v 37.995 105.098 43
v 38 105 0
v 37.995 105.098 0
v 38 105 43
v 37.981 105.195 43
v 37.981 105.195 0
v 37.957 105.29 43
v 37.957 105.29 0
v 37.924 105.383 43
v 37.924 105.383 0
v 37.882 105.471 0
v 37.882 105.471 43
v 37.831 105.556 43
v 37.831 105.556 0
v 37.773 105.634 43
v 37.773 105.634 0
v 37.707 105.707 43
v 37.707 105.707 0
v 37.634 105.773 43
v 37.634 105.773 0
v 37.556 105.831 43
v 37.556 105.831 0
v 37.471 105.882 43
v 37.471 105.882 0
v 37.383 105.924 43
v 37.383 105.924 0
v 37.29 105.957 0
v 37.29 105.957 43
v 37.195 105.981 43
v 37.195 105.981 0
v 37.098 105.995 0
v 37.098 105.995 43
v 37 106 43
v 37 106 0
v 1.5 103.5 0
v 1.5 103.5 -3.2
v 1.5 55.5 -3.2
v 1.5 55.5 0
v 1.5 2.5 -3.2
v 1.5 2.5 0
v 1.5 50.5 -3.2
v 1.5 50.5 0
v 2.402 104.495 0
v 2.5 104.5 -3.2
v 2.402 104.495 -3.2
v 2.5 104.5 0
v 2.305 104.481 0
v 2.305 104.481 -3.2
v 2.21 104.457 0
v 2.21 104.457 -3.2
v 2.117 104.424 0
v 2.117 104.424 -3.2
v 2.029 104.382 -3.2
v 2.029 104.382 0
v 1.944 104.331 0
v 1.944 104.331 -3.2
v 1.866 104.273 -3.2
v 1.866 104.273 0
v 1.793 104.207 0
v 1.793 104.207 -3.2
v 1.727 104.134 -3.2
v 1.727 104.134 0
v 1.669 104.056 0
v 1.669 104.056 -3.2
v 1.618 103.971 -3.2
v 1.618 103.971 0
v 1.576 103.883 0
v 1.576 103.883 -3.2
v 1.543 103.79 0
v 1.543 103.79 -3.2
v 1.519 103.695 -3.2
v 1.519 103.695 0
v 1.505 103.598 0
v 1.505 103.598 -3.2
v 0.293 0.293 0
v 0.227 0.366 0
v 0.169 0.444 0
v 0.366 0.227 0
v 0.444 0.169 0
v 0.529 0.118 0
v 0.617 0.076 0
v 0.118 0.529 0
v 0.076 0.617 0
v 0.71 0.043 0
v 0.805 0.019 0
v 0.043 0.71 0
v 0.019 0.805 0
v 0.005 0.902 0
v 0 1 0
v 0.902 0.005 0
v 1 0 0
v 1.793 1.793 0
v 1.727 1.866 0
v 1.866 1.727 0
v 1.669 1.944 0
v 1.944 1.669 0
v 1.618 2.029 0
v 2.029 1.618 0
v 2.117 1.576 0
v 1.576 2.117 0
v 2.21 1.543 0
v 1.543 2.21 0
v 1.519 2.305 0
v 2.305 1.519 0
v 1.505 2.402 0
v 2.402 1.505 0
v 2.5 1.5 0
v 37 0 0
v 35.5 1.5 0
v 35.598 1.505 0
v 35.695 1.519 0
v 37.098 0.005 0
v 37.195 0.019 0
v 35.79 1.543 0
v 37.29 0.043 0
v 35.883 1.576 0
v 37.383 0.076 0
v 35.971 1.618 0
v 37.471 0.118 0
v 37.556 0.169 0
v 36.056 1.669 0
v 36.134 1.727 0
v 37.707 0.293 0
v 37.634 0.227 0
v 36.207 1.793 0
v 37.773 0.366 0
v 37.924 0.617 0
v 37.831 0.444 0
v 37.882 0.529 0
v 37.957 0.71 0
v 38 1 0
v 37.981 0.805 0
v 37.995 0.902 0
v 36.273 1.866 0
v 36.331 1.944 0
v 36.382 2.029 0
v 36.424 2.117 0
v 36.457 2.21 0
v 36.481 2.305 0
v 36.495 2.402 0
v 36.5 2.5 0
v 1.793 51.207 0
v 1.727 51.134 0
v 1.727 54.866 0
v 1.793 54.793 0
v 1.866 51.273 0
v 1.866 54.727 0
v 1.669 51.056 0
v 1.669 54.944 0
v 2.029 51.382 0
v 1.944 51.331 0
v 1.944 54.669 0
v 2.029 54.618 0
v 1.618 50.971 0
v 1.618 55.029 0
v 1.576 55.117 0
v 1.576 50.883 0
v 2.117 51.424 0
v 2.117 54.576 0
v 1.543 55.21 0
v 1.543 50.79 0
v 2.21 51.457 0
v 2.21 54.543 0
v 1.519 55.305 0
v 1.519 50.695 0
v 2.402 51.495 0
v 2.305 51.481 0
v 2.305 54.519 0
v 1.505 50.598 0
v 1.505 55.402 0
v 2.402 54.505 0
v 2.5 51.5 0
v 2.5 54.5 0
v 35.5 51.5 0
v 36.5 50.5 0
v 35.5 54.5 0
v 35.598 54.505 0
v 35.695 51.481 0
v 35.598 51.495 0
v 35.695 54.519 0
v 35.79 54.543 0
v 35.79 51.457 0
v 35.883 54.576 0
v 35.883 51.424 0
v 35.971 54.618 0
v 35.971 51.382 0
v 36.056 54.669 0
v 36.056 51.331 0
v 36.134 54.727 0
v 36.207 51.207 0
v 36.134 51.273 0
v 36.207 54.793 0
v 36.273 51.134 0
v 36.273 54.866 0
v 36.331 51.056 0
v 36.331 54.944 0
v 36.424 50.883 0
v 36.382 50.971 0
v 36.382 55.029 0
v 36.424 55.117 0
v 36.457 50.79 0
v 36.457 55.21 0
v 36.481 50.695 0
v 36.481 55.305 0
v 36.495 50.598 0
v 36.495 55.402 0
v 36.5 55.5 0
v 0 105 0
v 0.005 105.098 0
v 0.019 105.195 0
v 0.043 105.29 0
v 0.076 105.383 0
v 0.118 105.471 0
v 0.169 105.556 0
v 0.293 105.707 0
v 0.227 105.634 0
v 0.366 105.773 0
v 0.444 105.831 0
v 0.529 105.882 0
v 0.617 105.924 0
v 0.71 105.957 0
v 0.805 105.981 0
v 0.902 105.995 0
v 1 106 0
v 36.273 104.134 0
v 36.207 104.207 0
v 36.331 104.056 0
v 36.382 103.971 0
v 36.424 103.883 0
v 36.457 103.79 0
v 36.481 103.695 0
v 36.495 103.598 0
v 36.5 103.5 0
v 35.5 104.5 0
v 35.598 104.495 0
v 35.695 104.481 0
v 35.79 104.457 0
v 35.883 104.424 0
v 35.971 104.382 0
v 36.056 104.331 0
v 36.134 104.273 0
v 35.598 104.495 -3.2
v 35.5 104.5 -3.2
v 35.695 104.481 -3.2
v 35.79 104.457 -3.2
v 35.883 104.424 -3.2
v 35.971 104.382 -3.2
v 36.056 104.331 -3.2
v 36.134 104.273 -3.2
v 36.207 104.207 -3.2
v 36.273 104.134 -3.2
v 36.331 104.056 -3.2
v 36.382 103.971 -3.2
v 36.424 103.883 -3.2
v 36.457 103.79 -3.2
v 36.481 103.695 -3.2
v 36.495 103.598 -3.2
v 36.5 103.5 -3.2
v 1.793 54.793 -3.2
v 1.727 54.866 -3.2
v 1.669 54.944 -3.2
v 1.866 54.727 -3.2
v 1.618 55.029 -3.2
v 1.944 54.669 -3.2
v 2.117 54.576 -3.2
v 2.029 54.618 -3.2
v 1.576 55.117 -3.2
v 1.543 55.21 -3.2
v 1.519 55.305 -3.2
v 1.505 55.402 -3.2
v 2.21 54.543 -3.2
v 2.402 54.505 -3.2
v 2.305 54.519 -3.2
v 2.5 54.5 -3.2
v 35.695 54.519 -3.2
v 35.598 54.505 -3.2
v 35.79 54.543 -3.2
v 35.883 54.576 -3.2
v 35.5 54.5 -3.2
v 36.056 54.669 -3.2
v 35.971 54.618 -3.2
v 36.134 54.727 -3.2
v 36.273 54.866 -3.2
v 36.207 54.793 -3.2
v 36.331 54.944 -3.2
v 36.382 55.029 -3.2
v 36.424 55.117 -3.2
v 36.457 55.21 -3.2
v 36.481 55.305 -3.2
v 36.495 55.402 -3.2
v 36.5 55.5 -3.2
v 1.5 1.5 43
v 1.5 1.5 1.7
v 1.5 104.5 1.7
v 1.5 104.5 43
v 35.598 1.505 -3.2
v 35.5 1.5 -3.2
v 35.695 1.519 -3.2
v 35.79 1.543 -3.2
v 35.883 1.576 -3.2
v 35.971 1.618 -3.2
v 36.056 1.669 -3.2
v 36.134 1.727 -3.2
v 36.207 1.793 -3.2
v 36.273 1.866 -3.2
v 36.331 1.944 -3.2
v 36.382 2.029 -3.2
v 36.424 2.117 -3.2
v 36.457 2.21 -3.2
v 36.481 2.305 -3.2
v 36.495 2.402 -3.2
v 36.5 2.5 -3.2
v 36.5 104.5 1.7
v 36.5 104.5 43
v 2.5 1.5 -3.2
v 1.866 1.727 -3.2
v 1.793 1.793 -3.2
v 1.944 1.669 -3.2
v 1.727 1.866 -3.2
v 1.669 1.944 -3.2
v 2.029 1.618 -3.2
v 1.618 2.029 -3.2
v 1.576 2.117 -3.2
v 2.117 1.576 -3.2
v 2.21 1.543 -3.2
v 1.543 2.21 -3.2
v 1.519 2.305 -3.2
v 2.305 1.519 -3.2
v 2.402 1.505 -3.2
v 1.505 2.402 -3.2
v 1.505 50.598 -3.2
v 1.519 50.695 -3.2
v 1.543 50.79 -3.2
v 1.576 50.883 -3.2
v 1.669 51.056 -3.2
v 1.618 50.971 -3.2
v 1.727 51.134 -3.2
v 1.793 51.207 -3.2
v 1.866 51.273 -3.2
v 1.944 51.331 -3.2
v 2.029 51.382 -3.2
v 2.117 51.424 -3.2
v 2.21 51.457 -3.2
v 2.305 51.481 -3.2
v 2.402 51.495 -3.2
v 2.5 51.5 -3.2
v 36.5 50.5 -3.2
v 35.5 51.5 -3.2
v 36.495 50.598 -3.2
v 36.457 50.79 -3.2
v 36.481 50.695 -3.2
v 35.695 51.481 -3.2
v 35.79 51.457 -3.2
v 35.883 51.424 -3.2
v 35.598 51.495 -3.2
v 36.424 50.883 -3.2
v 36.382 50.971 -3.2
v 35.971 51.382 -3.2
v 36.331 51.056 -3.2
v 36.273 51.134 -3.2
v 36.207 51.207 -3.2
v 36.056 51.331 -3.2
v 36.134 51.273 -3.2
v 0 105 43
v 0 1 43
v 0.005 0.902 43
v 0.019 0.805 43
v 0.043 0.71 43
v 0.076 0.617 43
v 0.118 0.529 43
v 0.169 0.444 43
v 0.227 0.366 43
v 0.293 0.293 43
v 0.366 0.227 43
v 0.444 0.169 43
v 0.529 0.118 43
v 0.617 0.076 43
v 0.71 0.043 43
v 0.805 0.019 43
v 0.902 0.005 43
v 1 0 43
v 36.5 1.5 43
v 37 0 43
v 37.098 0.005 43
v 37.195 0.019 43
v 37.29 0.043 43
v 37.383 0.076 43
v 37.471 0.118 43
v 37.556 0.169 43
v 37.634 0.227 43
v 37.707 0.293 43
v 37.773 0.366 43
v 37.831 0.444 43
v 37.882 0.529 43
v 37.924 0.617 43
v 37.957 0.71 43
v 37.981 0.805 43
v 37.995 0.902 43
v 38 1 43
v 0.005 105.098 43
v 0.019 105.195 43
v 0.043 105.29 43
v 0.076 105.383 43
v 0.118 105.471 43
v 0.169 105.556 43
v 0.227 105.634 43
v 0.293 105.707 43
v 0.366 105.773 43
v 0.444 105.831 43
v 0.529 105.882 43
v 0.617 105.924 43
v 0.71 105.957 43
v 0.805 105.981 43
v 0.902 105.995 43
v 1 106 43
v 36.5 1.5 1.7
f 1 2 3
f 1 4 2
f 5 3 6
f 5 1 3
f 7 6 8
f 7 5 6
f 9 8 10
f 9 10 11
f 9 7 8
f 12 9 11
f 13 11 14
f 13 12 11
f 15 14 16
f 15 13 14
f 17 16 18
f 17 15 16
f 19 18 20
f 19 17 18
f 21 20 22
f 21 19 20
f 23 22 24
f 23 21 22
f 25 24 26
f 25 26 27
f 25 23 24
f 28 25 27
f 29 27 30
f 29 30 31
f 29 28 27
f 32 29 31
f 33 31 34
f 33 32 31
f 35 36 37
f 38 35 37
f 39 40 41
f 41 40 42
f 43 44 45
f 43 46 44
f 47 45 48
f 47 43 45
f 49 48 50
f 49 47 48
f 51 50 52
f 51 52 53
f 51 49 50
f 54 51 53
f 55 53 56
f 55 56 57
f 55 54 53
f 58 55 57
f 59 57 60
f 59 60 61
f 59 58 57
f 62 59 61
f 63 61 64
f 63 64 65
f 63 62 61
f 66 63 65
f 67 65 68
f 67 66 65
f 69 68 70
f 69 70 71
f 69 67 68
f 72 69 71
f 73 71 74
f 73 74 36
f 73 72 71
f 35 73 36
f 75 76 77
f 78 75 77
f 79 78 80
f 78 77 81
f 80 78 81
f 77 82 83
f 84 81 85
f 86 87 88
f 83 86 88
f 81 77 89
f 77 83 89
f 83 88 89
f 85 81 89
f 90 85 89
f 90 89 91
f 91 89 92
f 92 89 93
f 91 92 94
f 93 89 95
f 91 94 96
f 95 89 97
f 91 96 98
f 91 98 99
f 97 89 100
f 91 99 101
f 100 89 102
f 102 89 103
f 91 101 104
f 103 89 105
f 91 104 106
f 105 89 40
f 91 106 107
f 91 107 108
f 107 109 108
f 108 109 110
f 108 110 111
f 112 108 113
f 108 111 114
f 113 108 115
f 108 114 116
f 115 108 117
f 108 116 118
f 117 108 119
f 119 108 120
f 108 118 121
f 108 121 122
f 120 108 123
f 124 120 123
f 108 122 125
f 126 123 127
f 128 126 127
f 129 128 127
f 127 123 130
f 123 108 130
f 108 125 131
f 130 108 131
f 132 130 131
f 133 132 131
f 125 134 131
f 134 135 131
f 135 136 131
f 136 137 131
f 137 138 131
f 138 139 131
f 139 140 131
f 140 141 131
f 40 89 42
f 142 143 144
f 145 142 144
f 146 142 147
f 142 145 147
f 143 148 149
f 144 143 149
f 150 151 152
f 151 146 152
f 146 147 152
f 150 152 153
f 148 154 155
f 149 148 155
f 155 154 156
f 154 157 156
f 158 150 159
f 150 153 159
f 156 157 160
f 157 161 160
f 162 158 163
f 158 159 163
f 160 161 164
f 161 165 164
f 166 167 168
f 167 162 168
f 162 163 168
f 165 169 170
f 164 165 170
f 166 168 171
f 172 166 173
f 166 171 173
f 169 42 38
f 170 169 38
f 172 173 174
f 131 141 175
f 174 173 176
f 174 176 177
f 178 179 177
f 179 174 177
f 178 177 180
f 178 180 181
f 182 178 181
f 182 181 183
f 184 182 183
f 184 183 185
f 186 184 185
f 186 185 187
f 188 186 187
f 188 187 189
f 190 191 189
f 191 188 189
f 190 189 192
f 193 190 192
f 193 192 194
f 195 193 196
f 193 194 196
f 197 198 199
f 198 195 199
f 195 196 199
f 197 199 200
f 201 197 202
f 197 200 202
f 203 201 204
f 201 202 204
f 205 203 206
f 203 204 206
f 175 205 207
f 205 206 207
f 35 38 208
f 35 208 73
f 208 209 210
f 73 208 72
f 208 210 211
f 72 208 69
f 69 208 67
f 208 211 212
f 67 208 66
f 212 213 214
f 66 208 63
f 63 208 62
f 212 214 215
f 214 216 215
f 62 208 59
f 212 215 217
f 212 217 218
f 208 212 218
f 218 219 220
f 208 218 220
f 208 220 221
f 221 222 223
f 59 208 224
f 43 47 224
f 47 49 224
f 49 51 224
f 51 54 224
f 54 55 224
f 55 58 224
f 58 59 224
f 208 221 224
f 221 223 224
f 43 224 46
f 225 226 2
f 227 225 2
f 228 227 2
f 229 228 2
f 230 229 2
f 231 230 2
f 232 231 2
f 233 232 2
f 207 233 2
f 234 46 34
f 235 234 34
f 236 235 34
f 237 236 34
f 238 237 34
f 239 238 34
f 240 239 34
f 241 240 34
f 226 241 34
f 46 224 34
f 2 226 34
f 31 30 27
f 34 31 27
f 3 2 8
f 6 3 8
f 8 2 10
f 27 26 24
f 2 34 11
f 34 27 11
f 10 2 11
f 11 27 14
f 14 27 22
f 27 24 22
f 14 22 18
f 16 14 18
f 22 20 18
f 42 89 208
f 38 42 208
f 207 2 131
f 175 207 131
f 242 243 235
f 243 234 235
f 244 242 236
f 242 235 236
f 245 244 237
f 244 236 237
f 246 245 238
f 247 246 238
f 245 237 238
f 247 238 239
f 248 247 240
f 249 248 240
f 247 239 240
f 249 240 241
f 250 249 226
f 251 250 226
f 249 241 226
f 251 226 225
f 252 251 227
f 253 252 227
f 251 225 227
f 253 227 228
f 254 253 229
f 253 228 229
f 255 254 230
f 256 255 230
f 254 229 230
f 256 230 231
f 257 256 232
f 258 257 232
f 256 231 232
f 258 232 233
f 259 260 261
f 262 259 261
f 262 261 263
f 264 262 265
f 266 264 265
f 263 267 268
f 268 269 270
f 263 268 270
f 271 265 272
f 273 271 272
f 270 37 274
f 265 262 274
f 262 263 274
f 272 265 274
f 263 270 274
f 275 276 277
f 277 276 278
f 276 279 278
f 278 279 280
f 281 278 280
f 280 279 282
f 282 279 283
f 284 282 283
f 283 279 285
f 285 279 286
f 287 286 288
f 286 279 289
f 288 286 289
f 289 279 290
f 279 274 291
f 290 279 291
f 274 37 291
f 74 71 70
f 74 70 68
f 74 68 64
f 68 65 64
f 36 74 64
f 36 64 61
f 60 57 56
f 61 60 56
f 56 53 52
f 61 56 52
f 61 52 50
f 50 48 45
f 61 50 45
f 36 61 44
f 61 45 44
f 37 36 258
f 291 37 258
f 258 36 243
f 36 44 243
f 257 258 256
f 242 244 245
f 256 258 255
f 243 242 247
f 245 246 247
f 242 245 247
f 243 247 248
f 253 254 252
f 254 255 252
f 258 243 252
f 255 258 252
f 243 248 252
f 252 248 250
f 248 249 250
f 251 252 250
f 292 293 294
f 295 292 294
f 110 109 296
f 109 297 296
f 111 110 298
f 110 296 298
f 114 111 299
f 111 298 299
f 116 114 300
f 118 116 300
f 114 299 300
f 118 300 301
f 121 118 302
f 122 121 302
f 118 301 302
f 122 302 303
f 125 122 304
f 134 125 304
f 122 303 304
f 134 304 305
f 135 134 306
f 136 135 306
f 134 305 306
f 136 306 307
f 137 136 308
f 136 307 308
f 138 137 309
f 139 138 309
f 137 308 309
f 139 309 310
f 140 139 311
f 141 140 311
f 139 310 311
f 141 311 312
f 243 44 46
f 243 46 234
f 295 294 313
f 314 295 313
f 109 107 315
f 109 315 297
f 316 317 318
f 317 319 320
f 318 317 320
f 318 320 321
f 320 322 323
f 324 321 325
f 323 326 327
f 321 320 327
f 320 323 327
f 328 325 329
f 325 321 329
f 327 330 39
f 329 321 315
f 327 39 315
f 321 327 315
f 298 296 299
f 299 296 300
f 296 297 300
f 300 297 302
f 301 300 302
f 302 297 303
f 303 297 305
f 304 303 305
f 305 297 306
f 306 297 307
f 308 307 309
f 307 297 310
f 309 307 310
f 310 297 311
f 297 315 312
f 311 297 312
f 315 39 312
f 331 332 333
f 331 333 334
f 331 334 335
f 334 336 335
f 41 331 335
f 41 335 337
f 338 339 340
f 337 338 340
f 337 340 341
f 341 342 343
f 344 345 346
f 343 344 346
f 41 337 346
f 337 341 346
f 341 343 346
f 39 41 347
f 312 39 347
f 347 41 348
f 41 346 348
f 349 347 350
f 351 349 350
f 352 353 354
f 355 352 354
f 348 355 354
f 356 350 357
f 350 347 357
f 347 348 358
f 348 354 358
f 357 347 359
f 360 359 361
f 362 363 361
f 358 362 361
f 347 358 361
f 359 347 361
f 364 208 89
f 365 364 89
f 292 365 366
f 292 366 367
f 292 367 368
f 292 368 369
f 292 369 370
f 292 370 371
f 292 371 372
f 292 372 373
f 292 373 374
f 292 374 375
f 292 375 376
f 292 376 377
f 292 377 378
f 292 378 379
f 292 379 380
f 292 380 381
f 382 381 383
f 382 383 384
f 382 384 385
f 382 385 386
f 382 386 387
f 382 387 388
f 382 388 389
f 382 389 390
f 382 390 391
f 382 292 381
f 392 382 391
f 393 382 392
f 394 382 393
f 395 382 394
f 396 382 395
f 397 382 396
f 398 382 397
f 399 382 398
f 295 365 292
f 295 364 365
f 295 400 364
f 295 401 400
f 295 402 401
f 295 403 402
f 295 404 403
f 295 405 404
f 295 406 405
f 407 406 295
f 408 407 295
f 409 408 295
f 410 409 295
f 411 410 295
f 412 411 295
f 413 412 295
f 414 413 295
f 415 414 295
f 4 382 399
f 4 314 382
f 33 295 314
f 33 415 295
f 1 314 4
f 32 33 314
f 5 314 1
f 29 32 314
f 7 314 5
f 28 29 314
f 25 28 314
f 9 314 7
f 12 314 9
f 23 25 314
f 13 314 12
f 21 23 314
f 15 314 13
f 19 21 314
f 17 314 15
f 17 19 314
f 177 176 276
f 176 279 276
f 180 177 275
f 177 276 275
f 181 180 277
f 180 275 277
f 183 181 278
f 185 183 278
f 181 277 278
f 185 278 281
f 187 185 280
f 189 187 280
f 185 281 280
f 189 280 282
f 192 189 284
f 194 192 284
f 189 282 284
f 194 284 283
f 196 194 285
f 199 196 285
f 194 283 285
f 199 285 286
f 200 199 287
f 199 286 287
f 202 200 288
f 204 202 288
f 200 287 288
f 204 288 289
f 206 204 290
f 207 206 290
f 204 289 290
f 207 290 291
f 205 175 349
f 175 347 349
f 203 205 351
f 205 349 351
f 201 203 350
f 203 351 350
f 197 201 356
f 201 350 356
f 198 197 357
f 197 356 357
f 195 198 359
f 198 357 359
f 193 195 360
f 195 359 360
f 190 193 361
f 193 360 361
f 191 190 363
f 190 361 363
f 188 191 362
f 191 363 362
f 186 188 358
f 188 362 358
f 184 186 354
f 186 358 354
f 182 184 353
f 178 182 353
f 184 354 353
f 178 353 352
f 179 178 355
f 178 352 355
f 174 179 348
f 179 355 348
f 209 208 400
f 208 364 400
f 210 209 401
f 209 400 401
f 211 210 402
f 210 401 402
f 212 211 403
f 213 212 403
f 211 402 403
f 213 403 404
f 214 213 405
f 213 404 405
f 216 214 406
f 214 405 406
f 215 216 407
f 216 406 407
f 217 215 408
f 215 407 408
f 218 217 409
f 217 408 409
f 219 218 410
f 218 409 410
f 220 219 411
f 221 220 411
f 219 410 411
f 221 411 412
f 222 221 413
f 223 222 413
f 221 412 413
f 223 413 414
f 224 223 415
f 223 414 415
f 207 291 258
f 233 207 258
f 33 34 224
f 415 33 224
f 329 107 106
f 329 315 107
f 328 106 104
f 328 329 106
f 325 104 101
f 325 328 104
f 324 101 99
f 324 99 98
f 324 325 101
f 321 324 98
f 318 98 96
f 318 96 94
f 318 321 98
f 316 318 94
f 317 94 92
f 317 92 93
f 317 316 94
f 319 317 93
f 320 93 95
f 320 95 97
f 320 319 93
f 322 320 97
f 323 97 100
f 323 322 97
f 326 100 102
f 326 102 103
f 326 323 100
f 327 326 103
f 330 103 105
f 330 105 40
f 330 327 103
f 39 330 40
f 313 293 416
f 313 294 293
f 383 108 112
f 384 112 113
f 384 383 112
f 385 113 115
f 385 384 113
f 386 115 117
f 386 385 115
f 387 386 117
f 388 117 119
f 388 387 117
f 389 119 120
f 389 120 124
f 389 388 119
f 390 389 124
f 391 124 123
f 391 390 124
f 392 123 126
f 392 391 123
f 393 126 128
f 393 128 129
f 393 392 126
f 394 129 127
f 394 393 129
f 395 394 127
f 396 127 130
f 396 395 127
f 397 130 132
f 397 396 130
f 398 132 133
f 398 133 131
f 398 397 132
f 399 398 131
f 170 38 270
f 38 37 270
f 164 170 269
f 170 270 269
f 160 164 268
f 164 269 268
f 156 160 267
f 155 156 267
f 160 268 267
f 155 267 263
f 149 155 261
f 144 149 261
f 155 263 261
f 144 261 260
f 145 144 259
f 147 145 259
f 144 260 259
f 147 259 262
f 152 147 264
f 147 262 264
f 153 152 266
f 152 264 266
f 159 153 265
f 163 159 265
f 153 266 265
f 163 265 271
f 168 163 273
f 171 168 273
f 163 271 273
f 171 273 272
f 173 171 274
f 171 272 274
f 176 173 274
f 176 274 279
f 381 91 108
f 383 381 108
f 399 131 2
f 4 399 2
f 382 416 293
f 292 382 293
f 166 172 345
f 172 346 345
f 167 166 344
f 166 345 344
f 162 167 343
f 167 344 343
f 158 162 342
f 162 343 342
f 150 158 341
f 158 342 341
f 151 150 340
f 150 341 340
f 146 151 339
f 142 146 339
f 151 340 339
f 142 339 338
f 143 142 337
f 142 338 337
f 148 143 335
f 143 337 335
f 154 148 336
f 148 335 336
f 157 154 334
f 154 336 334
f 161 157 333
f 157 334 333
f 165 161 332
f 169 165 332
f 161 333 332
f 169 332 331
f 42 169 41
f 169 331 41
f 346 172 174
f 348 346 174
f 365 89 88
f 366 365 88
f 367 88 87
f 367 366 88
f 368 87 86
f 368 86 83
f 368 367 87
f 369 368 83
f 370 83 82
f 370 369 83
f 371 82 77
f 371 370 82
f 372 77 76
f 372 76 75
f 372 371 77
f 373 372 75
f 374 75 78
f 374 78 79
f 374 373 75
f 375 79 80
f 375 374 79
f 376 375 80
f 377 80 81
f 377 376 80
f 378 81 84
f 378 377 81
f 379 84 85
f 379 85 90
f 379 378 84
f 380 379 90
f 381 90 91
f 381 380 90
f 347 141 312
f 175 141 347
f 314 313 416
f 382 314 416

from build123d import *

# Parameters (mm, degrees)
F0_W     = 35
F0_H     = 50
F1_DEPTH = 3.2
F0_H_2   = 1.5
F2_DEPTH = 1.7
F3_DEPTH = 43
F4_R     = 1


with BuildPart() as f1:
    # F0 (on Top) → F1 (new body)
    with BuildSketch(Plane.XY):
        with Locations((19, 79.5)):
            Rectangle(F0_W, F0_H)
        with Locations((19, 26.5)):
            Rectangle(F0_W, F0_H)
    extrude(amount=-F1_DEPTH)

    # F0 (on Top) → F2 (join)
    with BuildSketch(Plane.XY):
        with Locations((19, 53.75)):
            Rectangle(F0_W, F0_H_2)
        Polygon((0, 53), (0, 0), (38, 0), (38, 53), (36.5, 53), (36.5, 51.5), (36.5, 1.5), (1.5, 1.5), (1.5, 51.5), (1.5, 53), align=None)
        with Locations((19, 26.5)):
            Rectangle(F0_W, F0_H)
        with Locations((19, 79.5)):
            Rectangle(F0_W, F0_H)
        with Locations((19, 52.25)):
            Rectangle(F0_W, F0_H_2)
    extrude(amount=F2_DEPTH)

    # F0 (on Top) → F3 (join)
    with BuildSketch(Plane.XY):
        Polygon((0, 106), (0, 53), (1.5, 53), (1.5, 54.5), (1.5, 104.5), (36.5, 104.5), (36.5, 54.5), (36.5, 53), (38, 53), (38, 106), align=None)
        Polygon((0, 53), (0, 0), (38, 0), (38, 53), (36.5, 53), (36.5, 51.5), (36.5, 1.5), (1.5, 1.5), (1.5, 51.5), (1.5, 53), align=None)
    extrude(amount=F3_DEPTH)

    # F4
    f4_edges = [f1.edges().sort_by_distance(p)[0] for p in [
        (0, 0, 21.5),
        (38, 0, 21.5),
        (38, 106, 21.5),
        (0, 106, 21.5),
        (1.5, 104.5, -1.6),
        (36.5, 104.5, -1.6),
        (36.5, 54.5, -1.6),
        (1.5, 54.5, -1.6),
        (1.5, 51.5, -1.6),
        (36.5, 51.5, -1.6),
        (36.5, 1.5, -1.6),
        (1.5, 1.5, -1.6),
    ]]
    fillet(f4_edges, radius=F4_R)


solid = f1.part
